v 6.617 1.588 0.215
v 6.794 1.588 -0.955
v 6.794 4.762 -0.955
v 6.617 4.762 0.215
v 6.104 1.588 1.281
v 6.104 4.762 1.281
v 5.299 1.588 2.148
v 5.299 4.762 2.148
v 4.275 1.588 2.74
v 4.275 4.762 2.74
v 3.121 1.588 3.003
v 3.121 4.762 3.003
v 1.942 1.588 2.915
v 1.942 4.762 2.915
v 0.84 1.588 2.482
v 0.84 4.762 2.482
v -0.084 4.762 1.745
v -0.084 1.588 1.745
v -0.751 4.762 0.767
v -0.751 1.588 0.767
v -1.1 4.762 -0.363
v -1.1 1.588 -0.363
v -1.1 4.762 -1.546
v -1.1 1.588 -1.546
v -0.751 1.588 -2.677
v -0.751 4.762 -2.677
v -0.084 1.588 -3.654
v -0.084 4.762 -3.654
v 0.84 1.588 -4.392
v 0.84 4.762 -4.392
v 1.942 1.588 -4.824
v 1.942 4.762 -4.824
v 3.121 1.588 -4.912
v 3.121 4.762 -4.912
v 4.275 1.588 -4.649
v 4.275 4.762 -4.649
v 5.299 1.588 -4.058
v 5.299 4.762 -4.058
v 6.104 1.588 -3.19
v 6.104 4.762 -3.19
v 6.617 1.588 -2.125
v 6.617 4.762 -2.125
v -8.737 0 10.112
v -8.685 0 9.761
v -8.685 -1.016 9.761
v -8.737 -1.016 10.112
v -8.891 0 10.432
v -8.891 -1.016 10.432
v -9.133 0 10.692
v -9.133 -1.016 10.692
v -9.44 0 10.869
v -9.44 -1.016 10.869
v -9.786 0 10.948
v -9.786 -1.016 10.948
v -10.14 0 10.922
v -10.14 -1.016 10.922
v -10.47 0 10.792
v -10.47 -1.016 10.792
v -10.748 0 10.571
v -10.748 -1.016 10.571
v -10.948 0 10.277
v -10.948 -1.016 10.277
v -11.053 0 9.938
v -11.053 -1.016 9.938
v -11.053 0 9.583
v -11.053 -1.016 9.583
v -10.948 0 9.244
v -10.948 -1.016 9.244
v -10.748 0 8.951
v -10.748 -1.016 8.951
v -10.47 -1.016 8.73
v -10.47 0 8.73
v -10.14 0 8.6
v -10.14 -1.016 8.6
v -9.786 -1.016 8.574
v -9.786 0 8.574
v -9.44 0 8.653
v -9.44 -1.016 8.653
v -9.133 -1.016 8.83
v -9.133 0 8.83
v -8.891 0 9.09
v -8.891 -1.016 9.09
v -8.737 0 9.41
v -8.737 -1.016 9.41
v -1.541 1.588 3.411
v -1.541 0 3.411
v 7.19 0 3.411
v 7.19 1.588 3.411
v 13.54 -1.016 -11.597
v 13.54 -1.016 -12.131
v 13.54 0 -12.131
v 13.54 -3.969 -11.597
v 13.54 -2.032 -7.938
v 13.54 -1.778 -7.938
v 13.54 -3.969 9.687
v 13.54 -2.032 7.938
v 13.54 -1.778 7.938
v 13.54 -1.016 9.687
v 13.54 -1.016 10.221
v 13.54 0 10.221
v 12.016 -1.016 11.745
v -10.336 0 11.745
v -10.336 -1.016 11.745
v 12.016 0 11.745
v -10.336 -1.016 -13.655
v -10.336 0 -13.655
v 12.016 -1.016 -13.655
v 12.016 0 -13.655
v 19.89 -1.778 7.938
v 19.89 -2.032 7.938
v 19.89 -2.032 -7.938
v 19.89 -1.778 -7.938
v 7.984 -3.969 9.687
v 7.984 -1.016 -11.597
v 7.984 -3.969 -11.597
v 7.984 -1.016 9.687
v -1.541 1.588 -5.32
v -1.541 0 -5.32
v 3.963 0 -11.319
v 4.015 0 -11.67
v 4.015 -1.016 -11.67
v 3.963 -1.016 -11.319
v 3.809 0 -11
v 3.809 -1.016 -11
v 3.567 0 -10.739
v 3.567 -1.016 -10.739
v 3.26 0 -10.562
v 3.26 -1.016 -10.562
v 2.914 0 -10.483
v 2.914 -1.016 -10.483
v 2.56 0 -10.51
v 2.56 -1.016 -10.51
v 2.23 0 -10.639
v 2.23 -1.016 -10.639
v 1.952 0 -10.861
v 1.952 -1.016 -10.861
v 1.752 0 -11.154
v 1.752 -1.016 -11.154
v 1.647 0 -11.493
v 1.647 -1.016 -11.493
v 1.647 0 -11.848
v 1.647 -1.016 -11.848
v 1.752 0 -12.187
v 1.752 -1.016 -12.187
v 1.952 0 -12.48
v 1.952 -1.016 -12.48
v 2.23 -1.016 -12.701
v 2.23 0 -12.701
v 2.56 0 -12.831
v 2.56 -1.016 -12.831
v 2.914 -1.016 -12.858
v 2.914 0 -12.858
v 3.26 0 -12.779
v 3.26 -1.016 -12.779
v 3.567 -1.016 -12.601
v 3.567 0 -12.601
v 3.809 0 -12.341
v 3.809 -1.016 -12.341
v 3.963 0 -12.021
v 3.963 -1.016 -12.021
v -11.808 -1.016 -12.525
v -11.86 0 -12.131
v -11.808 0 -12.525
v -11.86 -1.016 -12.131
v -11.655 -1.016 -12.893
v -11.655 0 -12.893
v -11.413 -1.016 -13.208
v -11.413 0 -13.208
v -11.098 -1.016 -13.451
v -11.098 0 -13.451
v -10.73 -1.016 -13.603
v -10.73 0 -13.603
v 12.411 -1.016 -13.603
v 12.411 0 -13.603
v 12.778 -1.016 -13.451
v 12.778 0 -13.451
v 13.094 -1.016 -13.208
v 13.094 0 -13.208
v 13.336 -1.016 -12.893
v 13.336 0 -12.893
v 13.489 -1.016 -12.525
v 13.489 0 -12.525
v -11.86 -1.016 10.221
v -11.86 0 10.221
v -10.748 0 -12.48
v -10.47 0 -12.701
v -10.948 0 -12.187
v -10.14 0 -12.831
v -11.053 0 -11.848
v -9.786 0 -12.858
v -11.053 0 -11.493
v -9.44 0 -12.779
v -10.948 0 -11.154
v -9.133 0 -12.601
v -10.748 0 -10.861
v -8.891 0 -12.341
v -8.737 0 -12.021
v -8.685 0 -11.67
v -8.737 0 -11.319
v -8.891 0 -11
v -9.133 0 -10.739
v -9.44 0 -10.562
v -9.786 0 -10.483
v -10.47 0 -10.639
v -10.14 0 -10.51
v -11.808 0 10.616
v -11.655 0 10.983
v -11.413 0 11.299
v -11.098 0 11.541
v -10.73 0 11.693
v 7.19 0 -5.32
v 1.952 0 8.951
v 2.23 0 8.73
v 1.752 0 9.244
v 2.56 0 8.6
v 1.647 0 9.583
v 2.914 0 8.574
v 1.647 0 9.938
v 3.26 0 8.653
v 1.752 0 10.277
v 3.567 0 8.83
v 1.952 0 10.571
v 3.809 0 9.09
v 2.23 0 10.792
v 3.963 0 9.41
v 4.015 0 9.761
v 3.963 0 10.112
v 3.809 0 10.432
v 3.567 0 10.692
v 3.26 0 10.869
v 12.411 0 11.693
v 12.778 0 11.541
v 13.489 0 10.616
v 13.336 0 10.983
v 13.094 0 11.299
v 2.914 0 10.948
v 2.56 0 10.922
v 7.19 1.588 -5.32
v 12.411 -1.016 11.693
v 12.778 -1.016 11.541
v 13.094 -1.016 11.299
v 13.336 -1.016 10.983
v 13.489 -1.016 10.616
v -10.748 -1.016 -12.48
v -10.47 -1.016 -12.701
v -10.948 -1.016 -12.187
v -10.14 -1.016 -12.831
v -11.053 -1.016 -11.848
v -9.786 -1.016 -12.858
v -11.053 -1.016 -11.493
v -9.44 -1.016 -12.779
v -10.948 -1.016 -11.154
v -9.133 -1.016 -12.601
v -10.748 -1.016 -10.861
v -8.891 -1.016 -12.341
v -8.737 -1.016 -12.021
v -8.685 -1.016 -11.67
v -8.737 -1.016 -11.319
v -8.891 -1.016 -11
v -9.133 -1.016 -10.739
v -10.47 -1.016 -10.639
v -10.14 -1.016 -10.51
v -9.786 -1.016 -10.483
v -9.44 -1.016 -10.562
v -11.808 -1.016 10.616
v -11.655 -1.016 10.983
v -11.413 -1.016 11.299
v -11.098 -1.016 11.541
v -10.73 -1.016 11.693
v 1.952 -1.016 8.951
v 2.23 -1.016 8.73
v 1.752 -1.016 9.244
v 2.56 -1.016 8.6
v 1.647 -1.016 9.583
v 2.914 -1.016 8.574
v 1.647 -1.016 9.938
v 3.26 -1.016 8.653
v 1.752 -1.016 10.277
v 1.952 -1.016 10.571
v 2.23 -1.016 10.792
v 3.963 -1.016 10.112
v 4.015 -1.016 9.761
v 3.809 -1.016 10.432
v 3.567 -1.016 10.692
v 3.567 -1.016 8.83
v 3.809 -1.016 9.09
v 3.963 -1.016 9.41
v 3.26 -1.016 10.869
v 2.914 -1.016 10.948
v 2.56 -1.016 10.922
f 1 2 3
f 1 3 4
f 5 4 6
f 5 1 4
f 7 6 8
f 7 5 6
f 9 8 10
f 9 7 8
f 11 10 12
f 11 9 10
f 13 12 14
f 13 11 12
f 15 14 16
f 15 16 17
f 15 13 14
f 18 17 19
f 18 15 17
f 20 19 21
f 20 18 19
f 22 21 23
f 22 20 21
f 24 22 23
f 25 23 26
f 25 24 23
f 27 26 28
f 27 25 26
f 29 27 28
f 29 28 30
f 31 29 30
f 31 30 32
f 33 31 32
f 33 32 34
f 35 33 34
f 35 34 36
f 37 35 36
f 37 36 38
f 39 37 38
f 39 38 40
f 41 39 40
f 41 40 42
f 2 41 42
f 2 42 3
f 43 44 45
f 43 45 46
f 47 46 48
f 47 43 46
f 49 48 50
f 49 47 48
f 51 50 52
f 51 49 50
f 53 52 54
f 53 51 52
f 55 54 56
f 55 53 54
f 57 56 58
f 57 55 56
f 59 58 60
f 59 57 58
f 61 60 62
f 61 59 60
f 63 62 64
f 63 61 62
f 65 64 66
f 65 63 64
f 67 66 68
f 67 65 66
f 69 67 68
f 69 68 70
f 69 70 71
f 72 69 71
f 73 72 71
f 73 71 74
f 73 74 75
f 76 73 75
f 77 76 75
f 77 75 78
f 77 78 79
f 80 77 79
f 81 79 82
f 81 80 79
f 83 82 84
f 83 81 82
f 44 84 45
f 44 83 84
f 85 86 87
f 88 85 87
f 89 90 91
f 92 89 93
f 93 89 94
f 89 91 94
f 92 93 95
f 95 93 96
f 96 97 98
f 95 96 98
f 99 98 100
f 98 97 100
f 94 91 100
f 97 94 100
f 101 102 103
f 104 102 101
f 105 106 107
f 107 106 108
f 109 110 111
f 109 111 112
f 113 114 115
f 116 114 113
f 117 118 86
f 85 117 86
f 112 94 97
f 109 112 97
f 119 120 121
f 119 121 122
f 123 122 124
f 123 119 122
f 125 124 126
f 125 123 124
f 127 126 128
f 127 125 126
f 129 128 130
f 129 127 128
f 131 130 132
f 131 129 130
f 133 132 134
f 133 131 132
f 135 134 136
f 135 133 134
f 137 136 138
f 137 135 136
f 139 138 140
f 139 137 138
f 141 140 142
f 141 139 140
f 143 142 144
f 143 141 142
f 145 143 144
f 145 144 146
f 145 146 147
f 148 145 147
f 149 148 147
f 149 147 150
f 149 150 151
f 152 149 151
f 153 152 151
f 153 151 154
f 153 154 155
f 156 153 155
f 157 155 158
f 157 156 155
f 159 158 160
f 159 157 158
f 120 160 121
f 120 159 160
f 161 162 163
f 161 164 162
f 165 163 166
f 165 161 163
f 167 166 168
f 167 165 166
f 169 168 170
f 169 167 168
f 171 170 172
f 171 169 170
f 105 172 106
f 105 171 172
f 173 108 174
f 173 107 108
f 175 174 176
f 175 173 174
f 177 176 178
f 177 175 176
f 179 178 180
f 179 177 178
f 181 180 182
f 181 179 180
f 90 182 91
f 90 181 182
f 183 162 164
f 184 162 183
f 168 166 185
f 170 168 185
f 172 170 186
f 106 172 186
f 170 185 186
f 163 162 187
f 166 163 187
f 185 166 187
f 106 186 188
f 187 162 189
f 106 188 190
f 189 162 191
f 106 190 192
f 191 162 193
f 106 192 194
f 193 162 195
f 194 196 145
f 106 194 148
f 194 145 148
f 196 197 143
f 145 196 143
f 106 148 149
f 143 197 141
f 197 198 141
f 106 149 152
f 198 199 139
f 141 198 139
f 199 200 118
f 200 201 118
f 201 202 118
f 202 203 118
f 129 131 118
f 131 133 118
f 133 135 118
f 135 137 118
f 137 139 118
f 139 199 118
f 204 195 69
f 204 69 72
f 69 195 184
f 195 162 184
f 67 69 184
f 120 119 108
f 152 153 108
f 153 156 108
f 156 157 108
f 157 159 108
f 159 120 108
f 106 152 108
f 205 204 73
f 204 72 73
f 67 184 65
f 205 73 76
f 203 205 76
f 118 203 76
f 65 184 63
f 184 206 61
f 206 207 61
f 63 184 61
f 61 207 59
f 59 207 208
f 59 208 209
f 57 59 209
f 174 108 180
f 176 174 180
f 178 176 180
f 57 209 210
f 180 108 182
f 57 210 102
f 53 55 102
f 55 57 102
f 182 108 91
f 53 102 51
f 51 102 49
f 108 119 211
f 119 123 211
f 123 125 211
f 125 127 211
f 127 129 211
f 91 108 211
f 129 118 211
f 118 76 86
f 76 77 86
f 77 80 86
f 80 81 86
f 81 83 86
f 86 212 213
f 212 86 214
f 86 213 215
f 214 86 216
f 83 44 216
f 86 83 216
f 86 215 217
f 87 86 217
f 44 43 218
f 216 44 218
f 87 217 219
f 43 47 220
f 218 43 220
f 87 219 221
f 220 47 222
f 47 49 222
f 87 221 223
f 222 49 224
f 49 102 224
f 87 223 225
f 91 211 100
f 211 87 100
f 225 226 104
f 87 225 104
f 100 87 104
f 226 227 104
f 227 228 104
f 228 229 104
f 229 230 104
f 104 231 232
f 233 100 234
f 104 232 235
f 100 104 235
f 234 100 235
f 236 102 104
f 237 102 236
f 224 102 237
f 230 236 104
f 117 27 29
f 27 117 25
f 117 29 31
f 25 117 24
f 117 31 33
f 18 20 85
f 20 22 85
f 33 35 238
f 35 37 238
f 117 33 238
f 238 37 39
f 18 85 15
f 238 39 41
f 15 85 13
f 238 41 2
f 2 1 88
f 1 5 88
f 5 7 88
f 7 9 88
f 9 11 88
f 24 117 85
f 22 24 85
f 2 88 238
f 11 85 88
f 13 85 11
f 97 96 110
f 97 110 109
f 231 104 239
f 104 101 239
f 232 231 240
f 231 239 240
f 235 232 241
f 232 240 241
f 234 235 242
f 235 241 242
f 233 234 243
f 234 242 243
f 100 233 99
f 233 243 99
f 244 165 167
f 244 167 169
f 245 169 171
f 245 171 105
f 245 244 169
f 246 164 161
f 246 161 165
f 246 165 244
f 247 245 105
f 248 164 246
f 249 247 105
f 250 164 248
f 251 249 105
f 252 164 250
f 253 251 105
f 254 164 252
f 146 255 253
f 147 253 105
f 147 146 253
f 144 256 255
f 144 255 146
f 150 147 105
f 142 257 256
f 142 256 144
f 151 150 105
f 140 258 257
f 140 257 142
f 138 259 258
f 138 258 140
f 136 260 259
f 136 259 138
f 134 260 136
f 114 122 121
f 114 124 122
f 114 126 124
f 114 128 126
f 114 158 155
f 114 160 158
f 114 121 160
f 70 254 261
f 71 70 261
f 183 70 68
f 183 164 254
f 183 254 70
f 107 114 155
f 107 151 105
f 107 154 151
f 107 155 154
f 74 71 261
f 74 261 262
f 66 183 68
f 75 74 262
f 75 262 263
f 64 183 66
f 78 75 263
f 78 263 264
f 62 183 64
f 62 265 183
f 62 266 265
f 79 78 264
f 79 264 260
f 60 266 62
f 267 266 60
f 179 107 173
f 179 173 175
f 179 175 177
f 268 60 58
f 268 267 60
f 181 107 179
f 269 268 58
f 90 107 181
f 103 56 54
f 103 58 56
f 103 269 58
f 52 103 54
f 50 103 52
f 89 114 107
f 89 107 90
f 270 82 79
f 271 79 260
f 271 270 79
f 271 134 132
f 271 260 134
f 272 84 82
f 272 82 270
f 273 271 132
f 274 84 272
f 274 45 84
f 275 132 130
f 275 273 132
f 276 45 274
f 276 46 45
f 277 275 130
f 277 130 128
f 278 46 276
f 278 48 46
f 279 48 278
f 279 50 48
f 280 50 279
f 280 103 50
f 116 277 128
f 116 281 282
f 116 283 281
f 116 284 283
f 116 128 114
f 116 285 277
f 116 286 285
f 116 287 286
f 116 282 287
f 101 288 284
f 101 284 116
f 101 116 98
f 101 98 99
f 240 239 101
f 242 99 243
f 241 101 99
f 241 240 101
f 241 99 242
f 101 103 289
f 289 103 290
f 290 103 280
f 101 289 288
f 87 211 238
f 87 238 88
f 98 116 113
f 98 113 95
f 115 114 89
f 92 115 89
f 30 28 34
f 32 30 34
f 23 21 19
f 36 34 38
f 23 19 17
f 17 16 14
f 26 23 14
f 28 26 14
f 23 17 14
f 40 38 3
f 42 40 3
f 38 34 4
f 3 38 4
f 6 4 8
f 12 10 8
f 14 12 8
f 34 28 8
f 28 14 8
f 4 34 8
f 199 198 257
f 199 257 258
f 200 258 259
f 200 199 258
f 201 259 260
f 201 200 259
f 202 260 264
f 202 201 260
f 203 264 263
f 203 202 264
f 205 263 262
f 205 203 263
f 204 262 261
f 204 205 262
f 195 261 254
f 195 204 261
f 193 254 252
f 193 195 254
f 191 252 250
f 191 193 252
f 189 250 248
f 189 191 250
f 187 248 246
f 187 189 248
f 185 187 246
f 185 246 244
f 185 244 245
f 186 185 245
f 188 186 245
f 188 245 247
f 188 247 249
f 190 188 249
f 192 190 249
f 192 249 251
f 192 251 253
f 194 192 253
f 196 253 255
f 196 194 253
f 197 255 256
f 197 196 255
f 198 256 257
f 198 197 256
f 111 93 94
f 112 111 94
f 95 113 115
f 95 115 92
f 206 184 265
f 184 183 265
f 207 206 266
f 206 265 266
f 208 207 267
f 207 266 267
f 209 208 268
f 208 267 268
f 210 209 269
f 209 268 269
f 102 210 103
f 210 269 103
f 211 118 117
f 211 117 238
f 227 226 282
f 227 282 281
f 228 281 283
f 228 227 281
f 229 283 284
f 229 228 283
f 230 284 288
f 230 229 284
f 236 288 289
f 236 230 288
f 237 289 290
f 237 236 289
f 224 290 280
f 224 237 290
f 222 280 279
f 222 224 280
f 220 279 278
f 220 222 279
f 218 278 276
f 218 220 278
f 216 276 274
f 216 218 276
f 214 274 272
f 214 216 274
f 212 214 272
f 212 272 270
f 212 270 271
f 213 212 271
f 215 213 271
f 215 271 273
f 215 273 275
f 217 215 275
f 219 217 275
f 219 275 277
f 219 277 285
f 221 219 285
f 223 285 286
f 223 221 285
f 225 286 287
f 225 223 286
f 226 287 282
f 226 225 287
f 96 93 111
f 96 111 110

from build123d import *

# Parameters (mm, degrees)
F0_W     = 25.4
F0_H     = 25.4
F0_R     = 1.190625
F0_W_2   = 8.73125
F0_H_2   = 8.73125
F0_R_2   = 3.96875
F1_DEPTH = 1.016
F2_DEPTH = 1.5875
F3_DEPTH = 4.7625
F4_R     = 1.524
F5_W     = 5.55625
F5_H     = 21.283928
F6_DEPTH = 2.95275
F7_W     = 0.254
F7_H     = 15.875
F8_DEPTH = 6.35


with BuildPart() as f1:
    # F0 (on Front) → F1 (new body)
    with BuildSketch(Plane.XZ):
        with Locations((0.840441, -0.954741)):
            Rectangle(F0_W, F0_H)
        with Locations((-9.875184, -11.670366)):
            Circle(F0_R, mode=Mode.SUBTRACT)
        with Locations((2.824816, -11.670366)):
            Circle(F0_R, mode=Mode.SUBTRACT)
        with Locations((2.824816, -0.954741)):
            Rectangle(F0_W_2, F0_H_2, mode=Mode.SUBTRACT)
        with Locations((-9.875184, 9.760884)):
            Circle(F0_R, mode=Mode.SUBTRACT)
        with Locations((2.824816, 9.760884)):
            Circle(F0_R, mode=Mode.SUBTRACT)
        with Locations((2.824816, -0.954741)):
            Rectangle(F0_W_2, F0_H_2)
        with Locations((2.824816, -0.954741)):
            Circle(F0_R_2, mode=Mode.SUBTRACT)
        with Locations((2.824816, -0.954741)):
            Circle(F0_R_2)
    extrude(amount=F1_DEPTH)

    # F0 (on Front) → F2 (join)
    with BuildSketch(Plane.XZ):
        with Locations((2.824816, -0.954741)):
            Rectangle(F0_W_2, F0_H_2)
        with Locations((2.824816, -0.954741)):
            Circle(F0_R_2, mode=Mode.SUBTRACT)
        with Locations((2.824816, -0.954741)):
            Circle(F0_R_2)
    extrude(amount=-F2_DEPTH)

    # F0 (on Front) → F3 (join)
    with BuildSketch(Plane.XZ):
        with Locations((2.824816, -0.954741)):
            Circle(F0_R_2)
    extrude(amount=-F3_DEPTH)

    # F4
    f4_edges = [f1.edges().sort_by_distance(p)[0] for p in [
        (-11.859559, -0.508, 11.745259),
        (-11.859559, -0.508, -13.654741),
        (13.540441, -0.508, -13.654741),
        (13.540441, -0.508, 11.745259),
    ]]
    fillet(f4_edges, radius=F4_R)

    # F5 (on face) → F6 (join)
    with BuildSketch(Plane.XZ.offset(1.016)):
        with Locations((10.762316, -0.954741)):
            Rectangle(F5_W, F5_H)
    extrude(amount=F6_DEPTH)

    # F7 (on face) → F8 (join)
    with BuildSketch(Plane.YZ.offset(13.540441)):
        with Locations((-1.905, 0)):
            Rectangle(F7_W, F7_H)
    extrude(amount=F8_DEPTH)


solid = f1.part
